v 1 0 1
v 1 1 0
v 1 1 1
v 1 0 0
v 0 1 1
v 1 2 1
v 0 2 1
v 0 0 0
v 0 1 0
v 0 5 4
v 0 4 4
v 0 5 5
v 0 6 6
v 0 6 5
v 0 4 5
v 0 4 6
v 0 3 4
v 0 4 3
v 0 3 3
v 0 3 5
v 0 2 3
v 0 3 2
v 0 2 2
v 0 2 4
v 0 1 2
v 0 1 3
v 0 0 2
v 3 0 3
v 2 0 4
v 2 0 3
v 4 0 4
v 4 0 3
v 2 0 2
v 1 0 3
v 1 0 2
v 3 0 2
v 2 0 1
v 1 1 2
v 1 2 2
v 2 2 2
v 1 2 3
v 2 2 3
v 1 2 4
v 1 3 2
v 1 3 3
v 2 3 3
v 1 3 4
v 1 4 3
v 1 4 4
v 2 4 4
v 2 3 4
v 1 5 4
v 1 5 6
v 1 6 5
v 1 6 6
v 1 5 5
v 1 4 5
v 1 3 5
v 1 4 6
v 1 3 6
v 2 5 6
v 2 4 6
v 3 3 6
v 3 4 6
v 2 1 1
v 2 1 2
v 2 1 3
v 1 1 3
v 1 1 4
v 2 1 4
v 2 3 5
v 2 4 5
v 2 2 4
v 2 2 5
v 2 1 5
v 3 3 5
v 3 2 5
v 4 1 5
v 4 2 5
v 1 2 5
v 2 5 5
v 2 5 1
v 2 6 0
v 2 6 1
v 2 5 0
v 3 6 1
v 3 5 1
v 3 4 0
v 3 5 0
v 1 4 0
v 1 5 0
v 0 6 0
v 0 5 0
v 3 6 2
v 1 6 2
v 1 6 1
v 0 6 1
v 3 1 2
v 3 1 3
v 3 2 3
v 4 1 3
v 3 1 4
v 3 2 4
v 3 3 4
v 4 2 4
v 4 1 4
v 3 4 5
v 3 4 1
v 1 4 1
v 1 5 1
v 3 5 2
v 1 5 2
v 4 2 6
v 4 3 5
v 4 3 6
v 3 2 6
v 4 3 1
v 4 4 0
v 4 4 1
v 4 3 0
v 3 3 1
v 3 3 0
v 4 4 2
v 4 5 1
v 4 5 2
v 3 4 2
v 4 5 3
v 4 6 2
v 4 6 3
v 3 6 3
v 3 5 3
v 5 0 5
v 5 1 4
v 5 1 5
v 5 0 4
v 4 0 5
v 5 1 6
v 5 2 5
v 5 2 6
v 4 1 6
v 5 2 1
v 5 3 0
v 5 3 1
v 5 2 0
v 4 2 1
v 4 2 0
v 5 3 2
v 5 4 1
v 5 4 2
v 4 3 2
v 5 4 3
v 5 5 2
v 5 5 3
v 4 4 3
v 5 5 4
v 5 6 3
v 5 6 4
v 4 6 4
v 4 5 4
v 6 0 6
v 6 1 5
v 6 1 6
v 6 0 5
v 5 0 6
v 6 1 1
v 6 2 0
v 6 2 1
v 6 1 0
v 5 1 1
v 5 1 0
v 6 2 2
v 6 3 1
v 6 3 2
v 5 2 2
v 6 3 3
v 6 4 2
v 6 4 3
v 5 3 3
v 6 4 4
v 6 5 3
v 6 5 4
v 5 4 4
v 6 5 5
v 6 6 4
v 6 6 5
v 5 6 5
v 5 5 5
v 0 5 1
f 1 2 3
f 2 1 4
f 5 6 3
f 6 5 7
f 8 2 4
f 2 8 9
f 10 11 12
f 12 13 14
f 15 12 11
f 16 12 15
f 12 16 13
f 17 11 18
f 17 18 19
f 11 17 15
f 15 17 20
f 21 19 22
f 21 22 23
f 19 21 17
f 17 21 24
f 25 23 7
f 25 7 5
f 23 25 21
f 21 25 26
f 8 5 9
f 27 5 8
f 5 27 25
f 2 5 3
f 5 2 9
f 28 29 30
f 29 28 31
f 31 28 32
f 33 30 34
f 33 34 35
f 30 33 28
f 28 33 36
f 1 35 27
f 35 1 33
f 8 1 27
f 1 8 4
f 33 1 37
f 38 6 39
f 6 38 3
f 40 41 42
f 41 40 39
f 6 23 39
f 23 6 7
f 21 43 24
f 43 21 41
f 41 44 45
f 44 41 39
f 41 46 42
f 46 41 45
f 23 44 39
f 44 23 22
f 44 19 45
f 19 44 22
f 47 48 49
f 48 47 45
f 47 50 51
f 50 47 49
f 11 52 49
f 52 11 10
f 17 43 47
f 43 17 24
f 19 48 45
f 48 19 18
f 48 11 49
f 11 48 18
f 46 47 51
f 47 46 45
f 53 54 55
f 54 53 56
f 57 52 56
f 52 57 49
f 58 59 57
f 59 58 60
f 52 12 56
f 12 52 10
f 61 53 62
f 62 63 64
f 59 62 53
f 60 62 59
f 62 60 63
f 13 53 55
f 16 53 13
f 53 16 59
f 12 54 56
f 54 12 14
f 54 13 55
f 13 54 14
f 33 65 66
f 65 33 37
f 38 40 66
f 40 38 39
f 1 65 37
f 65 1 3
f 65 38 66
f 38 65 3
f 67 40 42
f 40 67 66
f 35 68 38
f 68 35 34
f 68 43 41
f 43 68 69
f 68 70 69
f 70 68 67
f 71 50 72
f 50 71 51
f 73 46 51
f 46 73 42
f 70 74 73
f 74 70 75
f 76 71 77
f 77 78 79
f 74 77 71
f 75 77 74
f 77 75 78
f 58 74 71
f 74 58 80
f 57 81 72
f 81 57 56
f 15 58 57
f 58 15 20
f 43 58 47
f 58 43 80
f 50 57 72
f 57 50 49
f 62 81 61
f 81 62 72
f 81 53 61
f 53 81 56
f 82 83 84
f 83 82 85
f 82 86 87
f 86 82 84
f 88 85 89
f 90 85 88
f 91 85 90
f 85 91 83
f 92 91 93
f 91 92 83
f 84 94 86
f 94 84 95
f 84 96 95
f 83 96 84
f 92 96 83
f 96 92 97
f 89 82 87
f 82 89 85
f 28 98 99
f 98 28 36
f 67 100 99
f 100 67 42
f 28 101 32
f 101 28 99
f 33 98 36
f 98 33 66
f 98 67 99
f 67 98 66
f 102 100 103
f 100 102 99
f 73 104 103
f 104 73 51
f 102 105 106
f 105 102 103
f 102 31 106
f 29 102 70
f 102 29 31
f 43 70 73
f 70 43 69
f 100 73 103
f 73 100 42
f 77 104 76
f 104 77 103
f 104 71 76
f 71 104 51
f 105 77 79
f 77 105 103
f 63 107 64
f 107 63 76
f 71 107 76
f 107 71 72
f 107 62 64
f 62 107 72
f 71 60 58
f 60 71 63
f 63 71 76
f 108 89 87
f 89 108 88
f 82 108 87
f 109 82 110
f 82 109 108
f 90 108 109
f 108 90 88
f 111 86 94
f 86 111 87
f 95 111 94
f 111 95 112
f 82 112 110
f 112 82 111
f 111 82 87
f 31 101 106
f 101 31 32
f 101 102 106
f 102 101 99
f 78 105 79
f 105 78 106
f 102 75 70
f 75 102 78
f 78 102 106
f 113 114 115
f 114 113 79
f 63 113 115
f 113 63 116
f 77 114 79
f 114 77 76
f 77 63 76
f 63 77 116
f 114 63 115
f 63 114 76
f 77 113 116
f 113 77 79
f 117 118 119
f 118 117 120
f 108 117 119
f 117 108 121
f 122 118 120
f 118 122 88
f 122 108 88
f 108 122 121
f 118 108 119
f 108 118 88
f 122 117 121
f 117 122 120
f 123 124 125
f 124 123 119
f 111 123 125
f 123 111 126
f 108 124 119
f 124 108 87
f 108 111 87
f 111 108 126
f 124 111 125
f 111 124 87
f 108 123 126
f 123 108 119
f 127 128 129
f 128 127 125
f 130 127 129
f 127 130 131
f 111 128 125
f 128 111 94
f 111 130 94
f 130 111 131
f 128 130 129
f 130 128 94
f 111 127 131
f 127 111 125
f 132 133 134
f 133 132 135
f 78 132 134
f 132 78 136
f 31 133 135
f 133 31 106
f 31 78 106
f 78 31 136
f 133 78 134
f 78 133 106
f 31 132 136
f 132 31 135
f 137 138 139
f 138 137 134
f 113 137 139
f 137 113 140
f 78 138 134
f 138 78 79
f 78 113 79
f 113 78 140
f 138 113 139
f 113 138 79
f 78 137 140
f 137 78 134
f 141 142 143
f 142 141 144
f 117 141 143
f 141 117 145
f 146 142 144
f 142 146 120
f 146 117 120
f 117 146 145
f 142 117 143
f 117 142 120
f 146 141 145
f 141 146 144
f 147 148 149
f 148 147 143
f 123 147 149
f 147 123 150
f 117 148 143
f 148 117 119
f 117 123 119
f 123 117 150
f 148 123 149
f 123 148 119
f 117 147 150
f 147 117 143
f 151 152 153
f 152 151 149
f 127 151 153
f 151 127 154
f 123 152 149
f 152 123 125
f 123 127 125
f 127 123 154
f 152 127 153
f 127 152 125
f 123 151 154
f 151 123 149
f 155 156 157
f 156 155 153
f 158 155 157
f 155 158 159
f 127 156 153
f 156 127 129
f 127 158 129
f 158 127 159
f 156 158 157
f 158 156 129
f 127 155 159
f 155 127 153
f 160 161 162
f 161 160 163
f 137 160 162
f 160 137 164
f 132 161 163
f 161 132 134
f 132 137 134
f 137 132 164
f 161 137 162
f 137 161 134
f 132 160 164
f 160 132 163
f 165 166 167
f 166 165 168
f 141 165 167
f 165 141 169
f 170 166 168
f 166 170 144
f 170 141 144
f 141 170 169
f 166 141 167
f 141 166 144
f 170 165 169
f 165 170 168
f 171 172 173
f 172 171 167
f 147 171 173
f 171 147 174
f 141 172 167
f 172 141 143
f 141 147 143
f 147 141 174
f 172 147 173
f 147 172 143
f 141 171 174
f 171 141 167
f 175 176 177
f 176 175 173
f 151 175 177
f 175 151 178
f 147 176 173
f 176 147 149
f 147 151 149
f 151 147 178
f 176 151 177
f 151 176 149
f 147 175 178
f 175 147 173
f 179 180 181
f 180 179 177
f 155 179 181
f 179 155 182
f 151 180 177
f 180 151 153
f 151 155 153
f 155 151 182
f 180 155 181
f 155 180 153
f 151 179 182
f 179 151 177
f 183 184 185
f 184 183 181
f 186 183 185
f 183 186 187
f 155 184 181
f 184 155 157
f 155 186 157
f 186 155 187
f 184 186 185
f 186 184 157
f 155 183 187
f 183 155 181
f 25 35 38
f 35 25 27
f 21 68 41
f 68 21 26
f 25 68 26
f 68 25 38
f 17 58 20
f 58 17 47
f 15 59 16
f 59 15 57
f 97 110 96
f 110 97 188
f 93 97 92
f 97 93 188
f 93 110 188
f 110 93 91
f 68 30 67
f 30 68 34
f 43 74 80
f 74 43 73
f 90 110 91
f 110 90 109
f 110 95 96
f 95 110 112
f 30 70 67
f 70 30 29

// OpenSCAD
union() {
    translate([0, 0, 0]) cube([1, 1, 1]);
    translate([0, 1, 1]) cube([1, 1, 1]);
    translate([0, 2, 2]) cube([1, 1, 1]);
    translate([0, 3, 3]) cube([1, 1, 1]);
    translate([0, 4, 4]) cube([1, 1, 1]);
    translate([0, 5, 5]) cube([1, 1, 1]);
    translate([1, 0, 1]) cube([1, 1, 1]);
    translate([1, 1, 2]) cube([1, 1, 1]);
    translate([1, 2, 3]) cube([1, 1, 1]);
    translate([1, 3, 4]) cube([1, 1, 1]);
    translate([1, 4, 5]) cube([1, 1, 1]);
    translate([1, 5, 0]) cube([1, 1, 1]);
    translate([2, 0, 2]) cube([1, 1, 1]);
    translate([2, 1, 3]) cube([1, 1, 1]);
    translate([2, 2, 4]) cube([1, 1, 1]);
    translate([2, 3, 5]) cube([1, 1, 1]);
    translate([2, 4, 0]) cube([1, 1, 1]);
    translate([2, 5, 1]) cube([1, 1, 1]);
    translate([3, 0, 3]) cube([1, 1, 1]);
    translate([3, 1, 4]) cube([1, 1, 1]);
    translate([3, 2, 5]) cube([1, 1, 1]);
    translate([3, 3, 0]) cube([1, 1, 1]);
    translate([3, 4, 1]) cube([1, 1, 1]);
    translate([3, 5, 2]) cube([1, 1, 1]);
    translate([4, 0, 4]) cube([1, 1, 1]);
    translate([4, 1, 5]) cube([1, 1, 1]);
    translate([4, 2, 0]) cube([1, 1, 1]);
    translate([4, 3, 1]) cube([1, 1, 1]);
    translate([4, 4, 2]) cube([1, 1, 1]);
    translate([4, 5, 3]) cube([1, 1, 1]);
    translate([5, 0, 5]) cube([1, 1, 1]);
    translate([5, 1, 0]) cube([1, 1, 1]);
    translate([5, 2, 1]) cube([1, 1, 1]);
    translate([5, 3, 2]) cube([1, 1, 1]);
    translate([5, 4, 3]) cube([1, 1, 1]);
    translate([5, 5, 4]) cube([1, 1, 1]);
    translate([0, 0, 1]) cube([1, 1, 1]);
    translate([0, 1, 2]) cube([1, 1, 1]);
    translate([0, 2, 3]) cube([1, 1, 1]);
    translate([0, 3, 4]) cube([1, 1, 1]);
    translate([0, 4, 5]) cube([1, 1, 1]);
    translate([0, 5, 0]) cube([1, 1, 1]);
    translate([1, 0, 2]) cube([1, 1, 1]);
    translate([1, 1, 3]) cube([1, 1, 1]);
    translate([1, 2, 4]) cube([1, 1, 1]);
    translate([1, 3, 5]) cube([1, 1, 1]);
    translate([1, 4, 0]) cube([1, 1, 1]);
    translate([1, 5, 1]) cube([1, 1, 1]);
    translate([2, 0, 3]) cube([1, 1, 1]);
    translate([2, 1, 4]) cube([1, 1, 1]);
}
